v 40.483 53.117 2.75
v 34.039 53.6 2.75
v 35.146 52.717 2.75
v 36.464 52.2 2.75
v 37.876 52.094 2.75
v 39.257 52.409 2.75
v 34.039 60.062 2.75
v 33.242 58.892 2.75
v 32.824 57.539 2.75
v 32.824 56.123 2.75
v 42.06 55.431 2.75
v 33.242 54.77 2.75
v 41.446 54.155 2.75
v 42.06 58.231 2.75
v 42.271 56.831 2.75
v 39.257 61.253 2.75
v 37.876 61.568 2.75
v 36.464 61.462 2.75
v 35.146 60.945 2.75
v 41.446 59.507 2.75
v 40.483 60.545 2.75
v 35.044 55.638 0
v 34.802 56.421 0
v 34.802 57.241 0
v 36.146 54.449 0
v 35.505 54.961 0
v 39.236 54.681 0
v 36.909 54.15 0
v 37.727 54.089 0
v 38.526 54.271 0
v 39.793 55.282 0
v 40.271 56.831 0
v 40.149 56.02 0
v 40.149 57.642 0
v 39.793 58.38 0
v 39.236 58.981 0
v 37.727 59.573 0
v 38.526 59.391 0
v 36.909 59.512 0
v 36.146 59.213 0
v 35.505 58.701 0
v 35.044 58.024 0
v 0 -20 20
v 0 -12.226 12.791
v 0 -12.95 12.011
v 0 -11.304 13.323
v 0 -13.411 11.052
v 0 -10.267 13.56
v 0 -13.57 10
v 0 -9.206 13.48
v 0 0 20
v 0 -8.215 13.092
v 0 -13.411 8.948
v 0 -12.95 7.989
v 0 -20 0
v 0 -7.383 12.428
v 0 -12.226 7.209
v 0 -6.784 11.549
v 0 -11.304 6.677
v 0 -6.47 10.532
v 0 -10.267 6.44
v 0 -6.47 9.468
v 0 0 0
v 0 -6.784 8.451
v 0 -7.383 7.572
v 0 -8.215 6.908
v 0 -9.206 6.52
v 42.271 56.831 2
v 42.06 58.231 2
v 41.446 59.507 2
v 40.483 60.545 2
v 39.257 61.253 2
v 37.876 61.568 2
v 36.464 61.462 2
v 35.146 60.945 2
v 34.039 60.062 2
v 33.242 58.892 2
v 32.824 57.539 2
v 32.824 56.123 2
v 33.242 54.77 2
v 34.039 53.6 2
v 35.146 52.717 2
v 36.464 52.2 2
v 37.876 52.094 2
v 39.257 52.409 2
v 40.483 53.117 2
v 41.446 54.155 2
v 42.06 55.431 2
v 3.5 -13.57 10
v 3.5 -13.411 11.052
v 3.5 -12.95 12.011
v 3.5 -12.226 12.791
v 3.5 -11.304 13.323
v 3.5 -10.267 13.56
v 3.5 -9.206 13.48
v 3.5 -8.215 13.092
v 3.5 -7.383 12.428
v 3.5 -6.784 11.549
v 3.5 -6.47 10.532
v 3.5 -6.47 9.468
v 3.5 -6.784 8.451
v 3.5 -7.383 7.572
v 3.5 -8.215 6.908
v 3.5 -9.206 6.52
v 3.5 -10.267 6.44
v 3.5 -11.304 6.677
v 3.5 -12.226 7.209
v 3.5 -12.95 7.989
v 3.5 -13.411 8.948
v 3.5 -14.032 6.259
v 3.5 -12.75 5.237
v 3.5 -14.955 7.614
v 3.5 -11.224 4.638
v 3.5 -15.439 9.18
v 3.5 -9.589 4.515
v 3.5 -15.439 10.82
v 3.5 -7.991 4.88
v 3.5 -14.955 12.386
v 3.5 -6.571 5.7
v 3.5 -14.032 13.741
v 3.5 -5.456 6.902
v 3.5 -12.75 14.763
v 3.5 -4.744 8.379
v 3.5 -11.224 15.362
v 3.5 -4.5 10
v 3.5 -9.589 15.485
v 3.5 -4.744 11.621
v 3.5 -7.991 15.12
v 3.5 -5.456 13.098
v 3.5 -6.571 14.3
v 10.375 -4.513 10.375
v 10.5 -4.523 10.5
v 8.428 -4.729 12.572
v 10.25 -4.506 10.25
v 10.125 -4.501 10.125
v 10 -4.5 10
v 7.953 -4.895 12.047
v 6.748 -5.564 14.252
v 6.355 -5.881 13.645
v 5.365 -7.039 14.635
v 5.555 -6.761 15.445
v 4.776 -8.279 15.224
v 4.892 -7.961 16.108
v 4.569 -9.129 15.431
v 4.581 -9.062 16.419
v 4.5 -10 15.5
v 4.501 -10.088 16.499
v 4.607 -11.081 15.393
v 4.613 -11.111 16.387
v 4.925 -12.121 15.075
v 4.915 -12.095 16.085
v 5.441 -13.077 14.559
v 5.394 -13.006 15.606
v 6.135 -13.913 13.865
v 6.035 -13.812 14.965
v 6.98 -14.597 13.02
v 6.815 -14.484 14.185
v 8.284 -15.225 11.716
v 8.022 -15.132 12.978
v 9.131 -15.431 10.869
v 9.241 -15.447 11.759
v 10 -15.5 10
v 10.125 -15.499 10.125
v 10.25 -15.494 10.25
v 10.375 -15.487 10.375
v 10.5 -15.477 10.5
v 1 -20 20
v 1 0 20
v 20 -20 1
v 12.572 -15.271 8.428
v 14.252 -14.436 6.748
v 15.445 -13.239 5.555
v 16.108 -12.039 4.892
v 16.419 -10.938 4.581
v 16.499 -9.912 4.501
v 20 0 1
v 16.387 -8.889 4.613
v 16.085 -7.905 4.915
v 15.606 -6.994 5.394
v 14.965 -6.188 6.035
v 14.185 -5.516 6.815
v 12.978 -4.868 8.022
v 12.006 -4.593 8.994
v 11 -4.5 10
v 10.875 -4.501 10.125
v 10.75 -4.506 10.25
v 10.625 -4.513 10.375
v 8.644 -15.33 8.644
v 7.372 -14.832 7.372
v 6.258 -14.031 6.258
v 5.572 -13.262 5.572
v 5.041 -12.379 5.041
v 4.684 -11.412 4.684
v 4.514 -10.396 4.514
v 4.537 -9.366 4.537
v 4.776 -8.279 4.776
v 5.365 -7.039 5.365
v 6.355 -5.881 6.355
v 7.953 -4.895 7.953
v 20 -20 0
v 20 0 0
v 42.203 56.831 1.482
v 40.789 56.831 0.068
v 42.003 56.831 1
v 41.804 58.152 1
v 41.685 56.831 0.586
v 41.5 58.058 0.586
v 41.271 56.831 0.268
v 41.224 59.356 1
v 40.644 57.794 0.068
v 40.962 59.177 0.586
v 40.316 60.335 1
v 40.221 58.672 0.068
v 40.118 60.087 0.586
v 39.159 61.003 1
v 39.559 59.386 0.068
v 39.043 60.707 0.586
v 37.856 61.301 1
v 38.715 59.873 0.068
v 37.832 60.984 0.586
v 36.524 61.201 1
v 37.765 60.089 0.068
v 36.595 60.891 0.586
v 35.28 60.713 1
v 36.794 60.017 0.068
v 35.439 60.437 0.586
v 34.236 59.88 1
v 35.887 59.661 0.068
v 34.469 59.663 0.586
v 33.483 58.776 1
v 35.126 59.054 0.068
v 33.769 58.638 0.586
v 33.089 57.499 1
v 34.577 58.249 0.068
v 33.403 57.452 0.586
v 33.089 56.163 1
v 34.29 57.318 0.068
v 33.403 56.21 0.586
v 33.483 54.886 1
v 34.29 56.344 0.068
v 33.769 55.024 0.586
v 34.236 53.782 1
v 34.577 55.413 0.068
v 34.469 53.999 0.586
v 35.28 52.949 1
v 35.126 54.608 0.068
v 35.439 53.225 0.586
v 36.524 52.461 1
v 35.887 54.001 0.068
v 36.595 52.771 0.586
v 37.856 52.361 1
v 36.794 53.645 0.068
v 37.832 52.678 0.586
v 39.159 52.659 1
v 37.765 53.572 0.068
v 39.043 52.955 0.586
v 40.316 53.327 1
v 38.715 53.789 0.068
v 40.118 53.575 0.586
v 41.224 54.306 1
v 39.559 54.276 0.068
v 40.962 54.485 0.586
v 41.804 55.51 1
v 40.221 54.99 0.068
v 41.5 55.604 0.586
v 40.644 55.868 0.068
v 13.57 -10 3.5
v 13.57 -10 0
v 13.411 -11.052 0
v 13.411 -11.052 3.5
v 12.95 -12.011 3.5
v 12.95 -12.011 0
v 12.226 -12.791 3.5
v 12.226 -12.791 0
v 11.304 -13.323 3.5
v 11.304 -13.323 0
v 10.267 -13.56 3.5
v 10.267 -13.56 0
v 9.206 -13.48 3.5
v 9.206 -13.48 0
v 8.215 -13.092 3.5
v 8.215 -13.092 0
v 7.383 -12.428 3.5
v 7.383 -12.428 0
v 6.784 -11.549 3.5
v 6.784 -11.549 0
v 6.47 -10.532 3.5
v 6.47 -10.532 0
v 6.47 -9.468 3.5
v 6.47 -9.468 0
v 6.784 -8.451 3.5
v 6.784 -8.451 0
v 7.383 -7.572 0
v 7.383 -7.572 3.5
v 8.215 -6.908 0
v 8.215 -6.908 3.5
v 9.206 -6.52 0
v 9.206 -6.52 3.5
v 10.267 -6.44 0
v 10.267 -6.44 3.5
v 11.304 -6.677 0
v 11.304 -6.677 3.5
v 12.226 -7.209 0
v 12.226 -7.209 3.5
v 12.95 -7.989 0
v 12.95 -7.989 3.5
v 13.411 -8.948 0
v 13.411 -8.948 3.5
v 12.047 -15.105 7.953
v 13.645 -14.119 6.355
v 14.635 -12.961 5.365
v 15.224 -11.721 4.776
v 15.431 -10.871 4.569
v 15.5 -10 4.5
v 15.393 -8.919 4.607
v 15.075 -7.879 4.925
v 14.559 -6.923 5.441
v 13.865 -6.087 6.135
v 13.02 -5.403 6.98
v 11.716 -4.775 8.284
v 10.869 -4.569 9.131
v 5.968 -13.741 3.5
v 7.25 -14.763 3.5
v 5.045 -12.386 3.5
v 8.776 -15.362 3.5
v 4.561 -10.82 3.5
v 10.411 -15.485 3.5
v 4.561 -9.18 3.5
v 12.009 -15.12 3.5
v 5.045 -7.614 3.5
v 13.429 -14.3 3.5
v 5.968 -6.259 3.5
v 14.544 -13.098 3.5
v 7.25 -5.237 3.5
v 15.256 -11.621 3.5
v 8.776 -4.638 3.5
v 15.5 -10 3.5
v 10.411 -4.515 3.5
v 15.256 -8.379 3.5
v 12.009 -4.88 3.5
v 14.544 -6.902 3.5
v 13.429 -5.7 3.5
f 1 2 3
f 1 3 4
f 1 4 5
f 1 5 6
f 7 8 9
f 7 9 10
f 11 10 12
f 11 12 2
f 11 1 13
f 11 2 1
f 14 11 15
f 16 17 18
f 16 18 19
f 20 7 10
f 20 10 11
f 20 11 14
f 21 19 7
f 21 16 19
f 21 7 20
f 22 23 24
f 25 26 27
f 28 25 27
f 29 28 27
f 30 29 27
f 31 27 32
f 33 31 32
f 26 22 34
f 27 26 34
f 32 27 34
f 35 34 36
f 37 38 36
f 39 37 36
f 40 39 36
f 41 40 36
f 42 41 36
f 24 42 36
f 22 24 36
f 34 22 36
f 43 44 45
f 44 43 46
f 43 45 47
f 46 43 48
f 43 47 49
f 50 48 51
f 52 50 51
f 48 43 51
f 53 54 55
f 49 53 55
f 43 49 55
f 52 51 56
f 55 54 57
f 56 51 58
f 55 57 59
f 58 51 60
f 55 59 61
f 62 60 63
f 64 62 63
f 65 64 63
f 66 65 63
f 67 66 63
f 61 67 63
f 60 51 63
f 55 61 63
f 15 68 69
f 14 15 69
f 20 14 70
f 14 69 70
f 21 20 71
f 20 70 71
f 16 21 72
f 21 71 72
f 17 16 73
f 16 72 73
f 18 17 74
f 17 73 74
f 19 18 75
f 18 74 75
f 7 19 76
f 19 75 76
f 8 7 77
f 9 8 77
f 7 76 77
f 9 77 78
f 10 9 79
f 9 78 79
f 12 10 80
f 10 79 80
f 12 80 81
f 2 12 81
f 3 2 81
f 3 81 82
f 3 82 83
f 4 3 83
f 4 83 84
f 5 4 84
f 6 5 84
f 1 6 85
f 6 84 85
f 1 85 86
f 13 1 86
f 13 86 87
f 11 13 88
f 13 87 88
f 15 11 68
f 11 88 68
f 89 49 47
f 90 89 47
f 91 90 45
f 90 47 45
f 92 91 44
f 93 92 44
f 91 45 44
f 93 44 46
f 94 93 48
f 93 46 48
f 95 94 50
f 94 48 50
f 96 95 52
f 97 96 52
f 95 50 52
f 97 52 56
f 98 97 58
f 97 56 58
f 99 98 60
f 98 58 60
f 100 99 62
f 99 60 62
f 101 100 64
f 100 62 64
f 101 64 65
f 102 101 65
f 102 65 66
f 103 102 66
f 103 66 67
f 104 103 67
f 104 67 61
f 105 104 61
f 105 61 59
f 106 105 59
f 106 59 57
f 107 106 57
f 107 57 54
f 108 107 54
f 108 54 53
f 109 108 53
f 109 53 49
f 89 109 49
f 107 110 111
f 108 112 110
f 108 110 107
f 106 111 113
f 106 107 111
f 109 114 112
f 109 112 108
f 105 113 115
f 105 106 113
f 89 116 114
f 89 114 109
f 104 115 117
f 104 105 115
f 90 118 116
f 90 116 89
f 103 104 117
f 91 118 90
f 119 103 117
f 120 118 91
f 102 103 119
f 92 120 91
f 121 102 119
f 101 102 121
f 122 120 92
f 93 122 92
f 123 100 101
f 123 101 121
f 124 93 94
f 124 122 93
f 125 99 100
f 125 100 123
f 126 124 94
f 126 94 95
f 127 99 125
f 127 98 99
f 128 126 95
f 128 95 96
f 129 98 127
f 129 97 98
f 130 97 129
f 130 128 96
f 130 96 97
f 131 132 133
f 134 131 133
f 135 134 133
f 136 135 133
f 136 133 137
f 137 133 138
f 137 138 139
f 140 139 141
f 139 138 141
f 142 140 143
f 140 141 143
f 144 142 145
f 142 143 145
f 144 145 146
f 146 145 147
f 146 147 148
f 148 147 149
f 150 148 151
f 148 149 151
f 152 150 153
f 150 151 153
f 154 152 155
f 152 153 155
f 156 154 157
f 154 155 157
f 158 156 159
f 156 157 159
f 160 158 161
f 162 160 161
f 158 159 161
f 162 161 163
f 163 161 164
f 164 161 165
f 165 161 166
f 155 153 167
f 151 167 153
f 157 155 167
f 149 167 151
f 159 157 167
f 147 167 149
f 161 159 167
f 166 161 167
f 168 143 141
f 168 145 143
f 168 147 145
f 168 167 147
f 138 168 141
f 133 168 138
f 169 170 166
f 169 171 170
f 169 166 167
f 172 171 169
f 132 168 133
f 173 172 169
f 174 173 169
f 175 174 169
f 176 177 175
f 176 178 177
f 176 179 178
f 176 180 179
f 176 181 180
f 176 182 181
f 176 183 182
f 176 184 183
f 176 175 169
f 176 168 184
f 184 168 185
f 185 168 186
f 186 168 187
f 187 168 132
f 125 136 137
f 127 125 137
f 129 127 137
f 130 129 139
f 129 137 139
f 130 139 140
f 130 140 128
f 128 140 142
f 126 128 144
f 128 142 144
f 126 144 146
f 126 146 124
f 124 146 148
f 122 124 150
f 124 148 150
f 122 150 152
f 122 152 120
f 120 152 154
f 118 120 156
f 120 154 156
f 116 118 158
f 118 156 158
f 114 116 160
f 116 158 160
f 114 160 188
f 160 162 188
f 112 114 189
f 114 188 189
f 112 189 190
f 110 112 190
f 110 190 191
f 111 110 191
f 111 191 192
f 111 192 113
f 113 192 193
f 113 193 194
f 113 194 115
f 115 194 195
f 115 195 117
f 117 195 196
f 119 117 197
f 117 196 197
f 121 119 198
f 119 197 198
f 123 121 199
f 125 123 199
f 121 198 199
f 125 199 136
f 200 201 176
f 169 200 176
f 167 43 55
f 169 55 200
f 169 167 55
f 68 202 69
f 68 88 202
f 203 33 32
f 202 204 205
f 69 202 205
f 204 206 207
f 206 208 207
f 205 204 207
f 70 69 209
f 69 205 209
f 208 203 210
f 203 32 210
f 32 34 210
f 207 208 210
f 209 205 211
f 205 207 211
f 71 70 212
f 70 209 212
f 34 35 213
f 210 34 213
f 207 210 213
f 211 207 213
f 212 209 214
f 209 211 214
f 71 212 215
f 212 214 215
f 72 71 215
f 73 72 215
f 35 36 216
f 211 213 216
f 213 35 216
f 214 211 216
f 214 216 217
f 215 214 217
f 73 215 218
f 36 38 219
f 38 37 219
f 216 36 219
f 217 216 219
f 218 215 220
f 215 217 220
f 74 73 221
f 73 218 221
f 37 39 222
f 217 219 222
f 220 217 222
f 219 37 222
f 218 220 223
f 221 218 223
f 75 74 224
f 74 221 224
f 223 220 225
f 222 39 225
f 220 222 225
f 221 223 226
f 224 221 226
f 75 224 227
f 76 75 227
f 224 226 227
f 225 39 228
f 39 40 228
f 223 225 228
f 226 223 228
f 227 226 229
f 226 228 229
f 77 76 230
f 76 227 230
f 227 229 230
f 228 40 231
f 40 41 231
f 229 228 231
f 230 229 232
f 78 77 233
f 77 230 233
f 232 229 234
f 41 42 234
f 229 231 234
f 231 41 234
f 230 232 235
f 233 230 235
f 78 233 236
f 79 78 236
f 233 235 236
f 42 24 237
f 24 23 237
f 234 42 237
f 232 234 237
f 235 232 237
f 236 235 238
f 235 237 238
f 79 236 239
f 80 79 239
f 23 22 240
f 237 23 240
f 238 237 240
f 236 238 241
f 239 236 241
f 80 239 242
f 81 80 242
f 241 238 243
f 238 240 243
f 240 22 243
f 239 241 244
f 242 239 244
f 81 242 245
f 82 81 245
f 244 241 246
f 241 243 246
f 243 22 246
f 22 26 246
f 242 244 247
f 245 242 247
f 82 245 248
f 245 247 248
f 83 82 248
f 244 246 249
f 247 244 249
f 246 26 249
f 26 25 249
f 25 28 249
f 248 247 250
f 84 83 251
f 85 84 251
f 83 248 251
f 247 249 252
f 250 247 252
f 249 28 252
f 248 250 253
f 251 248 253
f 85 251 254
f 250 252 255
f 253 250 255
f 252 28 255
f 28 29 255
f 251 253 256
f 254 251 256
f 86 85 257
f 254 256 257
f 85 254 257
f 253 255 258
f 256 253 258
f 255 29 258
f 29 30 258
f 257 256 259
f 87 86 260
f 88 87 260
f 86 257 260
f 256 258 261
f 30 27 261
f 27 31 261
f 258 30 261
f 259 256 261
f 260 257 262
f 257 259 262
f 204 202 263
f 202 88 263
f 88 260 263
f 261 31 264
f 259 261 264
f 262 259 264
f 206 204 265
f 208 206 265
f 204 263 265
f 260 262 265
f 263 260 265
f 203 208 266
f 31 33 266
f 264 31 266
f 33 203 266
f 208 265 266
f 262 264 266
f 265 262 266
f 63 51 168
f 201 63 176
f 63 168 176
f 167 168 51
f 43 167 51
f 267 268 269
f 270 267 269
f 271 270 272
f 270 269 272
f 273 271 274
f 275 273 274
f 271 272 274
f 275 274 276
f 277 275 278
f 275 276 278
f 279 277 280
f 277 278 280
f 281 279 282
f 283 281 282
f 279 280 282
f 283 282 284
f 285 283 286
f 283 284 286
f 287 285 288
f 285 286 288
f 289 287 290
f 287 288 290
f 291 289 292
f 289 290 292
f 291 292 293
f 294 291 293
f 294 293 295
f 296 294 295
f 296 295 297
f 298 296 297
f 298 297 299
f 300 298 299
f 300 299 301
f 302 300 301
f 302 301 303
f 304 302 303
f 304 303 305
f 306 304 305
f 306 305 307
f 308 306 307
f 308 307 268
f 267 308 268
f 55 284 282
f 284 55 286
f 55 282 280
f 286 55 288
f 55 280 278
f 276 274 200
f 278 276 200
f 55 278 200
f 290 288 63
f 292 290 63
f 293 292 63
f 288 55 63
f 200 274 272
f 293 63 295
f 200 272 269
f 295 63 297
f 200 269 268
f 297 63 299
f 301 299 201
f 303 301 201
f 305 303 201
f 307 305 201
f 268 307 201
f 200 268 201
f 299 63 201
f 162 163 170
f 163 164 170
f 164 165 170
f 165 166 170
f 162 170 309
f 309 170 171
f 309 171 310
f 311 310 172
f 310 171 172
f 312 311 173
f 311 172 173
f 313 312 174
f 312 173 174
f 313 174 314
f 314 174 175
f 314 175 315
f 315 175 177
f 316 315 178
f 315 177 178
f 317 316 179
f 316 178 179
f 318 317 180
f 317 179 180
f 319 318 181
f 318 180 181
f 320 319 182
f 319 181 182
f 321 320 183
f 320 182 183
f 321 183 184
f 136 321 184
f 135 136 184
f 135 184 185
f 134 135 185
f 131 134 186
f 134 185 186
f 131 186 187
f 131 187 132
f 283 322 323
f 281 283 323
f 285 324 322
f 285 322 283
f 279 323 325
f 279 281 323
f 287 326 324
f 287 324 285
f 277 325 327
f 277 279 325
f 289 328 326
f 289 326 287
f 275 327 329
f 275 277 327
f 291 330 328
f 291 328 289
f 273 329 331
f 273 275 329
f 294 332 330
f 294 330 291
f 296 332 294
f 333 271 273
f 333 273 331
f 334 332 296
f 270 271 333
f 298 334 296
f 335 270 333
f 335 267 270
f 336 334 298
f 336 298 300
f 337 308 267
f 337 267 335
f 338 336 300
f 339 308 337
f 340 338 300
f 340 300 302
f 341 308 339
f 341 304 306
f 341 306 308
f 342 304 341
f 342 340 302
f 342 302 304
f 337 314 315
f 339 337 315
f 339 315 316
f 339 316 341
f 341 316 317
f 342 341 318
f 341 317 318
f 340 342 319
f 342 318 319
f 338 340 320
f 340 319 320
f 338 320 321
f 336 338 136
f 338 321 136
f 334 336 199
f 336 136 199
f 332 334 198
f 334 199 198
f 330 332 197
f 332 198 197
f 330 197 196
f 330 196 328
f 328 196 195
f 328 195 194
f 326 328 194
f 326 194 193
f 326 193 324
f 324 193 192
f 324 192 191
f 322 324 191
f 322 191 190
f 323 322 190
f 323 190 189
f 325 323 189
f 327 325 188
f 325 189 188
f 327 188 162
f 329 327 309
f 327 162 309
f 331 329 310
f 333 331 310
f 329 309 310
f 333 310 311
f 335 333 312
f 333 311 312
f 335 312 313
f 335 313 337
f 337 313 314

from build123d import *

# Parameters (mm, degrees)
F1_DEPTH  = 20
F5_R      = 5.5
F6_DEPTH  = 16.5
F4_R      = 5.5
F7_DEPTH  = 16.5
F3_R      = 3.57
F8_DEPTH  = 20.001
F2_R      = 3.57
F9_DEPTH  = 20.001
F10_DEPTH = 20.001
F11_R     = 4.75
F12_DEPTH = 2.75
F13_R     = 2


with BuildPart() as f1:
    # F0 (on Front) → F1 (new body)
    with BuildSketch(Plane.XZ):
        Polygon((0, 20), (0, 0), (20, 0), (20, 1), (1, 20), align=None)
        Polygon((20, 20), (1, 20), (20, 1), align=None)
    extrude(amount=F1_DEPTH)

    # F5 (on face) → F6 (cut)
    with BuildSketch(Plane.XY.offset(20)):
        with Locations((10, -10)):
            Circle(F5_R)
    extrude(amount=-F6_DEPTH, mode=Mode.SUBTRACT)

    # F4 (on face) → F7 (cut)
    with BuildSketch(Plane.YZ.offset(20)):
        with Locations((-10, 10)):
            Circle(F4_R)
    extrude(amount=-F7_DEPTH, mode=Mode.SUBTRACT)

    # F3 (on face) → F8 (cut, through all)
    with BuildSketch(Plane(origin=(0, 0, 0), x_dir=(0, -1, 0), z_dir=(-1, 0, 0))):
        with Locations((10, 10)):
            Circle(F3_R)
    extrude(amount=-F8_DEPTH, mode=Mode.SUBTRACT)

    # F2 (on face) → F9 (cut, through all)
    with BuildSketch(Plane(origin=(0, 0, 0), x_dir=(1, 0, 0), z_dir=(0, 0, -1))):
        with Locations((10, 10)):
            Circle(F2_R)
    extrude(amount=-F9_DEPTH, mode=Mode.SUBTRACT)

    # F0 (on Front) → F10 (cut, through all)
    with BuildSketch(Plane.XZ):
        Polygon((20, 20), (1, 20), (20, 1), align=None)
    extrude(amount=F10_DEPTH, mode=Mode.SUBTRACT)


with BuildPart() as f12:
    # F11 (on Top) → F12 (new body)
    with BuildSketch(Plane.XY):
        with Locations((37.521183, 56.830995)):
            Circle(F11_R)
    extrude(amount=F12_DEPTH)

    # F13
    f13_edges = [f12.edges().sort_by_distance(p)[0] for p in [
        (32.771183, 56.830995, 0),
    ]]
    fillet(f13_edges, radius=F13_R)


solid = Compound([f1.part, f12.part])
